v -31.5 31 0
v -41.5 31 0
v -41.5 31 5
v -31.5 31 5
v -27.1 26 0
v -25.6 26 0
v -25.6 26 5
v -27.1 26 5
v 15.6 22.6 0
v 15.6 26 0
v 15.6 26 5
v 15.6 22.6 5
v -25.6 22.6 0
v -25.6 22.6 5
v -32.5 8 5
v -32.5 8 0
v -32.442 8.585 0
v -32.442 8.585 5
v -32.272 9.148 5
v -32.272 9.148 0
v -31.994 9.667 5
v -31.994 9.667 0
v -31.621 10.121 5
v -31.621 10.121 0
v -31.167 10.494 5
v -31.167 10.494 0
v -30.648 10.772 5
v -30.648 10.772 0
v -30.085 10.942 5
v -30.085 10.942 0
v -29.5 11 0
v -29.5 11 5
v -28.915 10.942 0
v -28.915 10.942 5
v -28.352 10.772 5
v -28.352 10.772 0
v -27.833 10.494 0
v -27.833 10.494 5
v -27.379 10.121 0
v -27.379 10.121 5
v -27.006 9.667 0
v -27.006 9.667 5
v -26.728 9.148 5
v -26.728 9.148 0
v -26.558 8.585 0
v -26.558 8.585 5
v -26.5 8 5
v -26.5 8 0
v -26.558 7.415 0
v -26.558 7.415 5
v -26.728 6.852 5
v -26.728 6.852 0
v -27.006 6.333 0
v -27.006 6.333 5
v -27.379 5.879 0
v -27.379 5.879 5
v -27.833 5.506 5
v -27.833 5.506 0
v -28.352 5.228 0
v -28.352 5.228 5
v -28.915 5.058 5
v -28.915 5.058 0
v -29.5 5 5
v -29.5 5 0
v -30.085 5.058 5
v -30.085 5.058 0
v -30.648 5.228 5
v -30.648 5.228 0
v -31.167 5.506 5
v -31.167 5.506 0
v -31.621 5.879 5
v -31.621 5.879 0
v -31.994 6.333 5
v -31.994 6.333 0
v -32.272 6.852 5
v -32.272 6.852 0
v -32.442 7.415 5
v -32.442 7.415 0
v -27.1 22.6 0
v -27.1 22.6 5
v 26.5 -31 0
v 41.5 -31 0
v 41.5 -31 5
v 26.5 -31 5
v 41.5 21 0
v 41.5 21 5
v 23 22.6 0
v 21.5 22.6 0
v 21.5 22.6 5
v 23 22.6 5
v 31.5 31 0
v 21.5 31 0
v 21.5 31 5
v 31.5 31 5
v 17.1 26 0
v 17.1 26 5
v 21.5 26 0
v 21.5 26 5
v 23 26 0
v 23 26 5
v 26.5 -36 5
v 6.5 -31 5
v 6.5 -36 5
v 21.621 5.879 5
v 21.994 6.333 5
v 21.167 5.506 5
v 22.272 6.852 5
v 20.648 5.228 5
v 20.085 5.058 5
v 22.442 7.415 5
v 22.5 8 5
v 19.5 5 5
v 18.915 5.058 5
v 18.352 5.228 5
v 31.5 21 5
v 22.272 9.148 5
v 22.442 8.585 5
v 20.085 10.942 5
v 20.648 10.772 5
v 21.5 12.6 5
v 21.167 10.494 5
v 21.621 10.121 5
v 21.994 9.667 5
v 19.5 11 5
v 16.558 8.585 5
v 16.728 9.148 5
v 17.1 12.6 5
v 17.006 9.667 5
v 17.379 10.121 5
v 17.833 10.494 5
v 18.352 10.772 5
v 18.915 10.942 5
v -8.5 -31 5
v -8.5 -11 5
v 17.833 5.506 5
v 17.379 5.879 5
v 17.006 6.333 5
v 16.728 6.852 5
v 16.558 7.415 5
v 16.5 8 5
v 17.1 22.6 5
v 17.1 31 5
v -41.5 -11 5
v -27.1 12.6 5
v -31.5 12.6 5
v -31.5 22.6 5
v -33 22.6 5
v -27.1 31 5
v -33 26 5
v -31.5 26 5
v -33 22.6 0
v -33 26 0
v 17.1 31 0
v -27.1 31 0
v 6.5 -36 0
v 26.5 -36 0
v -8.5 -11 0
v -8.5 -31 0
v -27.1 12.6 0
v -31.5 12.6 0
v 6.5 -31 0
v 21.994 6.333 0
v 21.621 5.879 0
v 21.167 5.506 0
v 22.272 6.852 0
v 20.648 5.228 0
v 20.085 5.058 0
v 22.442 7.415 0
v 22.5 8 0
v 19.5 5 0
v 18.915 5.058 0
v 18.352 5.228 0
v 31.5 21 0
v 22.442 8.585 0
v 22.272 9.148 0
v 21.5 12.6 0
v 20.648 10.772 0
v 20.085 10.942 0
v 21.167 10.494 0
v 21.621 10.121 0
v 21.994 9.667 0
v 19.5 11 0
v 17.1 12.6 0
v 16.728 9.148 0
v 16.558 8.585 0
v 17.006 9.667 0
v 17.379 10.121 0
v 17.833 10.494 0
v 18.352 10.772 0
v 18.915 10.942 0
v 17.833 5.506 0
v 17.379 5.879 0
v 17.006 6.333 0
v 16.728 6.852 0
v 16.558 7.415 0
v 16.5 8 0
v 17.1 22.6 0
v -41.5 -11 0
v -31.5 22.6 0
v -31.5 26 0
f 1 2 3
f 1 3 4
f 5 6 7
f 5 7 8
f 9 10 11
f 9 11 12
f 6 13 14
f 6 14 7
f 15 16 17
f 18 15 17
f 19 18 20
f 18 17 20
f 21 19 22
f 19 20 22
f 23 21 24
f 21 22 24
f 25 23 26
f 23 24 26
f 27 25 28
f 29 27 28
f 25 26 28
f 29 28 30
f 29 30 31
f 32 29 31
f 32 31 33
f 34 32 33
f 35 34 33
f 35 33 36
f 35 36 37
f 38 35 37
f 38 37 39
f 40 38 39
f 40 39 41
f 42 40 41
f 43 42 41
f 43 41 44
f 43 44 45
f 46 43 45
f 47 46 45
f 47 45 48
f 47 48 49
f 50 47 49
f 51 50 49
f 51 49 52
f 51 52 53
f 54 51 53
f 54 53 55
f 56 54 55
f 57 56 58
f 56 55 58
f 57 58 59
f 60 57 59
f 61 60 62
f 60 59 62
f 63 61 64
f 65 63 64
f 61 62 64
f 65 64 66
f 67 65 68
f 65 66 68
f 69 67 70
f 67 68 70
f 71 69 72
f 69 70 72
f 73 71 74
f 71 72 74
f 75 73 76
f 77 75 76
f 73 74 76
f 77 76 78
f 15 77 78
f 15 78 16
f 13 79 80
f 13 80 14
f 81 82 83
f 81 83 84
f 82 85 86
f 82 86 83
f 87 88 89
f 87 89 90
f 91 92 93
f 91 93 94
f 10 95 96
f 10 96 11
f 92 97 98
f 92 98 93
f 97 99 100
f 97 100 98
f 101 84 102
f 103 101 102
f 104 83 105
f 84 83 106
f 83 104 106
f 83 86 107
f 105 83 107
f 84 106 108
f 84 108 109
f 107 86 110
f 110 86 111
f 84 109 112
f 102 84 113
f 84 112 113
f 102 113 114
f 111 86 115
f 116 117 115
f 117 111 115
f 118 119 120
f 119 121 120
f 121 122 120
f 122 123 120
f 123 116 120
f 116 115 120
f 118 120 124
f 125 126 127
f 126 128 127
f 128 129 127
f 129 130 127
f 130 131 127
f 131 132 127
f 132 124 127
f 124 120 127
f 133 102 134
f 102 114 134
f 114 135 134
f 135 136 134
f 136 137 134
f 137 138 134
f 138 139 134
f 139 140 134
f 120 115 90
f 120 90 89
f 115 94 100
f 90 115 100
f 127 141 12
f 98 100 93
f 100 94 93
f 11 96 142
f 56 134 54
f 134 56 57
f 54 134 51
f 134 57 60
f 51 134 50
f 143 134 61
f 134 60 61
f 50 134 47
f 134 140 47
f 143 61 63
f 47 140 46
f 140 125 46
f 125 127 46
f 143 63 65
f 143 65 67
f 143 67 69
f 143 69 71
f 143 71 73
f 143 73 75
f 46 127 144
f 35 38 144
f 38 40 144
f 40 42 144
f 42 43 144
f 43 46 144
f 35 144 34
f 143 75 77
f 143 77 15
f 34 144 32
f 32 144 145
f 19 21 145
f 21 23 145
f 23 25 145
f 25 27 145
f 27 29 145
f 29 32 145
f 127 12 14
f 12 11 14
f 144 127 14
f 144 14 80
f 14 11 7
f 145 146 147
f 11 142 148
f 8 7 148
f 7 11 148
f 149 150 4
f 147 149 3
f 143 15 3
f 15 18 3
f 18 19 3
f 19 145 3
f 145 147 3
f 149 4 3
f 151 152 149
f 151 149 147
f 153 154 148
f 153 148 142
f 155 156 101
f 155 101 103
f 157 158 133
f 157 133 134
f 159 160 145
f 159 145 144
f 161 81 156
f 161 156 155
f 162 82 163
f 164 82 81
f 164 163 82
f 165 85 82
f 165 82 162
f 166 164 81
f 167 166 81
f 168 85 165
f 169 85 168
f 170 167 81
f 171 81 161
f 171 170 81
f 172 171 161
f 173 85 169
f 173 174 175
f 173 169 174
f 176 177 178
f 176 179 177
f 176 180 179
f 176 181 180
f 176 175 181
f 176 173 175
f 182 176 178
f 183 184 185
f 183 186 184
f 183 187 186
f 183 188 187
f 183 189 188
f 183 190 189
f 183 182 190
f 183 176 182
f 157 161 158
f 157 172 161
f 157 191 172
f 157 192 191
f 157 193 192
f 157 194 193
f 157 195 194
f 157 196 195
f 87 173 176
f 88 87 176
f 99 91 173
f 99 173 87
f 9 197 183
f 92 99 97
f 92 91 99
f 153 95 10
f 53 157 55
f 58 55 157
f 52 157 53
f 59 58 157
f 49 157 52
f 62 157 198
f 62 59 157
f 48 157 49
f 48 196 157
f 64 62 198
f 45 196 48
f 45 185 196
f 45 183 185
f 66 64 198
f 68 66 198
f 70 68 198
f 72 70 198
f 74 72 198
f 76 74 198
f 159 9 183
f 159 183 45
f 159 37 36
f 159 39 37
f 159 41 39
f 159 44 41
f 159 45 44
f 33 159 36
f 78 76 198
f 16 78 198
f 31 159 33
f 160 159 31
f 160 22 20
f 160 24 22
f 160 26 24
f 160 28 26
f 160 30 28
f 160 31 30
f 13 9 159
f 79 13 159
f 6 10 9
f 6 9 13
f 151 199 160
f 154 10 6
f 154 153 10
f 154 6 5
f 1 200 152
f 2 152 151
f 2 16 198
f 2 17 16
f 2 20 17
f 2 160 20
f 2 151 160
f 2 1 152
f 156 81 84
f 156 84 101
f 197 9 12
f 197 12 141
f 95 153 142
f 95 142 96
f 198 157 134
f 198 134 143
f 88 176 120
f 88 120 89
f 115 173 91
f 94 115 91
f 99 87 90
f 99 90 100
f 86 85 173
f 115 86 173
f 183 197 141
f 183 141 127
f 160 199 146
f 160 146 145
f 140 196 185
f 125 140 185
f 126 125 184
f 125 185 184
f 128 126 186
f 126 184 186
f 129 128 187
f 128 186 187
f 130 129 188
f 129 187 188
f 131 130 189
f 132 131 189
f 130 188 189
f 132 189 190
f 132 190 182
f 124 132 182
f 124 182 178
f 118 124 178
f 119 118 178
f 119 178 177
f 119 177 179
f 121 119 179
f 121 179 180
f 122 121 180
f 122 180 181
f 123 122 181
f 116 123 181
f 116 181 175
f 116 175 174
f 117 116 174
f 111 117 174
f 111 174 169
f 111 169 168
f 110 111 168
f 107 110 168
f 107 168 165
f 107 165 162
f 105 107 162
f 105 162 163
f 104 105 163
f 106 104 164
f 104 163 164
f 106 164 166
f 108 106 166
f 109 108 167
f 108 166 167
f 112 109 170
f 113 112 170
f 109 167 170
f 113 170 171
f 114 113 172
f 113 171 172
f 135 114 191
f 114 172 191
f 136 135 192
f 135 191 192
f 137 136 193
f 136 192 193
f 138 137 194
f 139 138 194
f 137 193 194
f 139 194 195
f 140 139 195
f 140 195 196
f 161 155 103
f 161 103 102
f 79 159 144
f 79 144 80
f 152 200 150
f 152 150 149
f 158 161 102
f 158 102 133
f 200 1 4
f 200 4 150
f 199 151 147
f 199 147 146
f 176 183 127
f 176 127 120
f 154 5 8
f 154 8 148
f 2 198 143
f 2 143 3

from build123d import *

# Parameters (mm, degrees)
BOSS_EXTRUDE1_DEPTH = 5
SKETCH2_W           = 33
SKETCH2_H           = 20
SKETCH2_W_2         = 10
SKETCH2_H_2         = 10
CUT_EXTRUDE1_DEPTH  = 5
CUT_EXTRUDE2_DEPTH  = 10
SKETCH4_R           = 3
CUT_EXTRUDE3_DEPTH  = 10


with BuildPart() as part:
    # Sketch1 → Boss-Extrude1 (new body)
    with BuildSketch(Plane.XY):
        Polygon((26.5, -31), (26.5, -36), (6.5, -36), (6.5, -31), (-41.5, -31), (-41.5, 31), (41.5, 31), (41.5, -31), align=None)
    extrude(amount=BOSS_EXTRUDE1_DEPTH)

    # Sketch2 → Cut-Extrude1 (cut)
    with BuildSketch(Plane(origin=(0, 0, 0), x_dir=(-1, 0, 0), z_dir=(0, 0, -1))):
        with Locations((25, -21)):
            Rectangle(SKETCH2_W, SKETCH2_H)
        with Locations((-36.5, 26)):
            Rectangle(SKETCH2_W_2, SKETCH2_H_2)
    extrude(amount=-CUT_EXTRUDE1_DEPTH, mode=Mode.SUBTRACT)

    # Sketch3 → Cut-Extrude2 (cut)
    with BuildSketch(Plane(origin=(0, 0, 0), x_dir=(-1, 0, 0), z_dir=(0, 0, -1))):
        Polygon((31.5, 22.6), (31.5, 12.6), (27.1, 12.6), (27.1, 22.6), (25.6, 22.6), (25.6, 26), (27.1, 26), (27.1, 31), (31.5, 31), (31.5, 26), (33, 26), (33, 22.6), align=None)
        Polygon((-17.1, 22.6), (-17.1, 12.6), (-21.5, 12.6), (-21.5, 22.6), (-23, 22.6), (-23, 26), (-21.5, 26), (-21.5, 31), (-17.1, 31), (-17.1, 26), (-15.6, 26), (-15.6, 22.6), align=None)
    extrude(amount=-CUT_EXTRUDE2_DEPTH, mode=Mode.SUBTRACT)

    # Sketch4 → Cut-Extrude3 (cut)
    with BuildSketch(Plane(origin=(0, 0, 0), x_dir=(-1, 0, 0), z_dir=(0, 0, -1))):
        with Locations((29.5, 8)):
            Circle(SKETCH4_R)
        with Locations((-19.5, 8)):
            Circle(SKETCH4_R)
    extrude(amount=-CUT_EXTRUDE3_DEPTH, mode=Mode.SUBTRACT)


solid = part.part
